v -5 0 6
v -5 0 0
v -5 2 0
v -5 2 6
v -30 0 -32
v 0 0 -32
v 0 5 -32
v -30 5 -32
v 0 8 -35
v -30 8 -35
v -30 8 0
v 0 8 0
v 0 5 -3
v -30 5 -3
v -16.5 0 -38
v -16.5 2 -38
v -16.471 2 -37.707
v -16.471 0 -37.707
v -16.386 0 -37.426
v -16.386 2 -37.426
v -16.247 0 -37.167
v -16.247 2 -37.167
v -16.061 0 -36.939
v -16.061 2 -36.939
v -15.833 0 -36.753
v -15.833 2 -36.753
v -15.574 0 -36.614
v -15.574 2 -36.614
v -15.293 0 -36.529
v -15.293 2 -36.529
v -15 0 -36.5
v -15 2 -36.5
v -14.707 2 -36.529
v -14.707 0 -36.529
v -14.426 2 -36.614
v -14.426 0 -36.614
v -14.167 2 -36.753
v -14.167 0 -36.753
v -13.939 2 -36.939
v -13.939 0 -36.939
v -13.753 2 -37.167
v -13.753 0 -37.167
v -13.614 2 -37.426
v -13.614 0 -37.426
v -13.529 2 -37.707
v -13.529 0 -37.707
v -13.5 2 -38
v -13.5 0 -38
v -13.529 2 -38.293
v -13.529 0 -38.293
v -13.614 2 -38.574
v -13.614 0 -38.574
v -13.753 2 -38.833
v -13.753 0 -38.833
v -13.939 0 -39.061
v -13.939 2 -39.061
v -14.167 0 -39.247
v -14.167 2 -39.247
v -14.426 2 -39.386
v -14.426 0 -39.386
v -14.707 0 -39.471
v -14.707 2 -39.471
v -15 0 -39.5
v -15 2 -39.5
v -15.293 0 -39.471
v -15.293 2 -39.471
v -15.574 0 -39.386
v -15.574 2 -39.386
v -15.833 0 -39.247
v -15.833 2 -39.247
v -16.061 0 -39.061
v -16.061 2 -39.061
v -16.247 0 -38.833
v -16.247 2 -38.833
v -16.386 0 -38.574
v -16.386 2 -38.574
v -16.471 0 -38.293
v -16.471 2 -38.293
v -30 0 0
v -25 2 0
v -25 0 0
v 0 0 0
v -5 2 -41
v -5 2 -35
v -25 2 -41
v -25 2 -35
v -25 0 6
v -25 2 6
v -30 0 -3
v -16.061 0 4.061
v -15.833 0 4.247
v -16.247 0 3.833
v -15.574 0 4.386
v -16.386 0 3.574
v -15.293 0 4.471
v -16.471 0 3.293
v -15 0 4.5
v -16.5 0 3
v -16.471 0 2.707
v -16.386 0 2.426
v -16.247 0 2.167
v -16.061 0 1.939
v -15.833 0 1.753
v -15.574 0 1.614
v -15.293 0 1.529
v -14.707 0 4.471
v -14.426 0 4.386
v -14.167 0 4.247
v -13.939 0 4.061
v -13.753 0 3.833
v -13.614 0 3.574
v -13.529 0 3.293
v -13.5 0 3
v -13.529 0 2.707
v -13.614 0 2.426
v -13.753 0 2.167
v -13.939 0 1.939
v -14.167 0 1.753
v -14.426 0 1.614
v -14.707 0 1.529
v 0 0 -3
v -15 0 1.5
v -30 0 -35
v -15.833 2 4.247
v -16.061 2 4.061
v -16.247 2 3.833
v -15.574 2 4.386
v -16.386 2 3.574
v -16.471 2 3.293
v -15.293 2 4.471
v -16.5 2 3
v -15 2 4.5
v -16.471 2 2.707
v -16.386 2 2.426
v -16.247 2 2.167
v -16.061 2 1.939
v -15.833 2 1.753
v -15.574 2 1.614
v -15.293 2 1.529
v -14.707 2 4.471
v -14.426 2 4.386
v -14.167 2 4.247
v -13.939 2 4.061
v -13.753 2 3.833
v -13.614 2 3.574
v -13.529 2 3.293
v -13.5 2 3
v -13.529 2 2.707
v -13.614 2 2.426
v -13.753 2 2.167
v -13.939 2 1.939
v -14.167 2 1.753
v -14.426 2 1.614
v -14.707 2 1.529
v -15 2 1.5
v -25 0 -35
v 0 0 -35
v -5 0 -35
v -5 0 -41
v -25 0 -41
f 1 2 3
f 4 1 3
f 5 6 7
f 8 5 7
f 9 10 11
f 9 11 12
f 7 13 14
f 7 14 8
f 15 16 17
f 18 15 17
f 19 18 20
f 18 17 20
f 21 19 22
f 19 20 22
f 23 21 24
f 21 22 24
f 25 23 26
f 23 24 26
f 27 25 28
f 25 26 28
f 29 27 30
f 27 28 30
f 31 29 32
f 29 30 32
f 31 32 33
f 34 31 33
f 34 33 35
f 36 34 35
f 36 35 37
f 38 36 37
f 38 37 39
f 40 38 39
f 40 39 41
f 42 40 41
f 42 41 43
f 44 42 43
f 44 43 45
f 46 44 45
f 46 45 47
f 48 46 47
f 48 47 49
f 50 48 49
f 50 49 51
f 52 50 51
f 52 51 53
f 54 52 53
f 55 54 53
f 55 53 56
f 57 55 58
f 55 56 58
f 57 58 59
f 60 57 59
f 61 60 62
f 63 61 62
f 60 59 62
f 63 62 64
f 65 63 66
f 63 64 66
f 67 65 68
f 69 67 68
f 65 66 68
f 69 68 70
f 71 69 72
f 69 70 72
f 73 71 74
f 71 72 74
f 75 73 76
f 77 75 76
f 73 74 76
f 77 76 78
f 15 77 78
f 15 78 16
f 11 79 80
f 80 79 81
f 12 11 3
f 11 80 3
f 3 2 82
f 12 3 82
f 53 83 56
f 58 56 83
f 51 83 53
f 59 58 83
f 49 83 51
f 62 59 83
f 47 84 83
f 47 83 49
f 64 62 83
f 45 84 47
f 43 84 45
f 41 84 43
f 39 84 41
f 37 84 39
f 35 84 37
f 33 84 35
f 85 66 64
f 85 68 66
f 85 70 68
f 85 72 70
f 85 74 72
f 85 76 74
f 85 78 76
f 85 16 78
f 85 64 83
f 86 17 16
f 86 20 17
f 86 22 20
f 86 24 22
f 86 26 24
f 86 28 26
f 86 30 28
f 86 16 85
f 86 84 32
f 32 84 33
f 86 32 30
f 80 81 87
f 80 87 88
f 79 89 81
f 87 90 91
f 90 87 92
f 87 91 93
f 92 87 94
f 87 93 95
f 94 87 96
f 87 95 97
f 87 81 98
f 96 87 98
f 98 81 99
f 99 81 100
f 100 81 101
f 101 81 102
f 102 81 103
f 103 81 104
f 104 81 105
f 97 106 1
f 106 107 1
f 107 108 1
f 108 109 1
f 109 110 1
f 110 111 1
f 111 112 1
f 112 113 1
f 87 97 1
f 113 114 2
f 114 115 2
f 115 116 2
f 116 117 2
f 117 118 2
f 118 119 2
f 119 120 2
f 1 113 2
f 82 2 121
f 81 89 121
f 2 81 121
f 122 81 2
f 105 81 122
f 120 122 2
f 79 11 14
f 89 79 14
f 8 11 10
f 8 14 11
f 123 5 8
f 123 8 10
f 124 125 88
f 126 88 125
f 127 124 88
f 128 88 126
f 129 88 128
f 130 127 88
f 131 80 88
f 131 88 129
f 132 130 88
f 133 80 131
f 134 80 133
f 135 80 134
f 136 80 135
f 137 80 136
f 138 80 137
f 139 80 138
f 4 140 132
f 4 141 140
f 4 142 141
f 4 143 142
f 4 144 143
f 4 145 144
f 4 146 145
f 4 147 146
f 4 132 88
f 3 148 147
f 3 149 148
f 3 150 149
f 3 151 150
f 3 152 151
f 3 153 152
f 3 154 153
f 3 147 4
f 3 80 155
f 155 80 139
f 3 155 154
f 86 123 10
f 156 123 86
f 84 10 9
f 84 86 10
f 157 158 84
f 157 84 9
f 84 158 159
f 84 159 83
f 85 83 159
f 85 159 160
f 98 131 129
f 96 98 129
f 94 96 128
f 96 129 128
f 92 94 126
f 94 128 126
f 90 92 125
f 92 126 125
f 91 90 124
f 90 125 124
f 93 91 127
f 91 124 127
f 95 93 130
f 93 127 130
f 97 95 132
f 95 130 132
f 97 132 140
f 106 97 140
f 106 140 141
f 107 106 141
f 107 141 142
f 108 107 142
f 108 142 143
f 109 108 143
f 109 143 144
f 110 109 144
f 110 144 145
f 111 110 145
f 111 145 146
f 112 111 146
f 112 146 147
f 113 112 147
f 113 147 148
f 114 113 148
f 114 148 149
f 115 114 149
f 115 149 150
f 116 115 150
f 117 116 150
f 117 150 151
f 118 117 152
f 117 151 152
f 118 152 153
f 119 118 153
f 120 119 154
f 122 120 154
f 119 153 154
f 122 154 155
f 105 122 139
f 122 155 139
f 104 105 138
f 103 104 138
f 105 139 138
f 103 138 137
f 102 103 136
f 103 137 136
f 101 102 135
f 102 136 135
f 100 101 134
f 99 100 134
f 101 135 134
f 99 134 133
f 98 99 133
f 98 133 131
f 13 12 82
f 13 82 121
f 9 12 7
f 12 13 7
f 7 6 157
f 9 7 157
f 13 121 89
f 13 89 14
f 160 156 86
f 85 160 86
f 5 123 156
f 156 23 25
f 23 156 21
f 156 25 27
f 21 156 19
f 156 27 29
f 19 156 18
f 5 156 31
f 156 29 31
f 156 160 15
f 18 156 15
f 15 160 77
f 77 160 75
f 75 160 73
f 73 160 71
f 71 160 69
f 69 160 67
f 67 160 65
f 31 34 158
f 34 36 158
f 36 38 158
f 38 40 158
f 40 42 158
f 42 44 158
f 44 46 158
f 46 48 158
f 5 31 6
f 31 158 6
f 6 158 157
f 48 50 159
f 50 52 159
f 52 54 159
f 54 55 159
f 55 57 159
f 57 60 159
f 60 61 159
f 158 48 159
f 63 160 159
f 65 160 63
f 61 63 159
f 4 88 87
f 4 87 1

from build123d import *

# Parameters (mm, degrees)
SKETCH1_W                 = 30
SKETCH1_H                 = 35
BOSS_EXTRUDE1_DEPTH       = 8
SKETCH3_W                 = 29
SKETCH3_H                 = 5
CUT_EXTRUDE1_DEPTH        = 68
SKETCH4_W                 = 20
SKETCH4_H                 = 2
BOSS_EXTRUDE2_DEPTH       = 6
SKETCH5_W                 = 20
SKETCH5_H                 = 2
BOSS_EXTRUDE3_DEPTH       = 6
F_3_0MM_DOWEL_HOLE1_D     = 3
F_3_0MM_DOWEL_HOLE1_DEPTH = 12
F_3_0MM_DOWEL_HOLE1_TIP   = 0.901290929


with BuildPart() as part:
    # Sketch1 → Boss-Extrude1 (new body)
    with BuildSketch(Plane(origin=(0, 0, 0), x_dir=(1, 0, 0), z_dir=(0, 1, 0))):
        with Locations((-15, 17.5)):
            Rectangle(SKETCH1_W, SKETCH1_H)
    extrude(amount=BOSS_EXTRUDE1_DEPTH)

    # Sketch3 → Cut-Extrude1 (cut)
    with BuildSketch(Plane(origin=(0, 0, 0), x_dir=(0, 0, -1), z_dir=(1, 0, 0))):
        with Locations((17.5, 2.5)):
            Rectangle(SKETCH3_W, SKETCH3_H)
    extrude(amount=-CUT_EXTRUDE1_DEPTH, mode=Mode.SUBTRACT)

    # Sketch4 → Boss-Extrude2 (add)
    with BuildSketch(Plane.XY):
        with Locations((-15, 1)):
            Rectangle(SKETCH4_W, SKETCH4_H)
    extrude(amount=BOSS_EXTRUDE2_DEPTH)

    # Sketch5 → Boss-Extrude3 (add)
    with BuildSketch(Plane(origin=(0, 0, -35), x_dir=(-1, 0, 0), z_dir=(0, 0, -1))):
        with Locations((15, 1)):
            Rectangle(SKETCH5_W, SKETCH5_H)
    extrude(amount=BOSS_EXTRUDE3_DEPTH)

    # Ø3.0mm Dowel Hole1
    with Locations(Plane.XZ):
        with Locations((-15, -38), (-15, 3)):
            Hole(F_3_0MM_DOWEL_HOLE1_D / 2, depth=F_3_0MM_DOWEL_HOLE1_DEPTH)
            with Locations((0, 0, -(F_3_0MM_DOWEL_HOLE1_DEPTH + F_3_0MM_DOWEL_HOLE1_TIP / 2))):  # 118° drill point
                Cone(0, F_3_0MM_DOWEL_HOLE1_D / 2, F_3_0MM_DOWEL_HOLE1_TIP, mode=Mode.SUBTRACT)


solid = part.part
